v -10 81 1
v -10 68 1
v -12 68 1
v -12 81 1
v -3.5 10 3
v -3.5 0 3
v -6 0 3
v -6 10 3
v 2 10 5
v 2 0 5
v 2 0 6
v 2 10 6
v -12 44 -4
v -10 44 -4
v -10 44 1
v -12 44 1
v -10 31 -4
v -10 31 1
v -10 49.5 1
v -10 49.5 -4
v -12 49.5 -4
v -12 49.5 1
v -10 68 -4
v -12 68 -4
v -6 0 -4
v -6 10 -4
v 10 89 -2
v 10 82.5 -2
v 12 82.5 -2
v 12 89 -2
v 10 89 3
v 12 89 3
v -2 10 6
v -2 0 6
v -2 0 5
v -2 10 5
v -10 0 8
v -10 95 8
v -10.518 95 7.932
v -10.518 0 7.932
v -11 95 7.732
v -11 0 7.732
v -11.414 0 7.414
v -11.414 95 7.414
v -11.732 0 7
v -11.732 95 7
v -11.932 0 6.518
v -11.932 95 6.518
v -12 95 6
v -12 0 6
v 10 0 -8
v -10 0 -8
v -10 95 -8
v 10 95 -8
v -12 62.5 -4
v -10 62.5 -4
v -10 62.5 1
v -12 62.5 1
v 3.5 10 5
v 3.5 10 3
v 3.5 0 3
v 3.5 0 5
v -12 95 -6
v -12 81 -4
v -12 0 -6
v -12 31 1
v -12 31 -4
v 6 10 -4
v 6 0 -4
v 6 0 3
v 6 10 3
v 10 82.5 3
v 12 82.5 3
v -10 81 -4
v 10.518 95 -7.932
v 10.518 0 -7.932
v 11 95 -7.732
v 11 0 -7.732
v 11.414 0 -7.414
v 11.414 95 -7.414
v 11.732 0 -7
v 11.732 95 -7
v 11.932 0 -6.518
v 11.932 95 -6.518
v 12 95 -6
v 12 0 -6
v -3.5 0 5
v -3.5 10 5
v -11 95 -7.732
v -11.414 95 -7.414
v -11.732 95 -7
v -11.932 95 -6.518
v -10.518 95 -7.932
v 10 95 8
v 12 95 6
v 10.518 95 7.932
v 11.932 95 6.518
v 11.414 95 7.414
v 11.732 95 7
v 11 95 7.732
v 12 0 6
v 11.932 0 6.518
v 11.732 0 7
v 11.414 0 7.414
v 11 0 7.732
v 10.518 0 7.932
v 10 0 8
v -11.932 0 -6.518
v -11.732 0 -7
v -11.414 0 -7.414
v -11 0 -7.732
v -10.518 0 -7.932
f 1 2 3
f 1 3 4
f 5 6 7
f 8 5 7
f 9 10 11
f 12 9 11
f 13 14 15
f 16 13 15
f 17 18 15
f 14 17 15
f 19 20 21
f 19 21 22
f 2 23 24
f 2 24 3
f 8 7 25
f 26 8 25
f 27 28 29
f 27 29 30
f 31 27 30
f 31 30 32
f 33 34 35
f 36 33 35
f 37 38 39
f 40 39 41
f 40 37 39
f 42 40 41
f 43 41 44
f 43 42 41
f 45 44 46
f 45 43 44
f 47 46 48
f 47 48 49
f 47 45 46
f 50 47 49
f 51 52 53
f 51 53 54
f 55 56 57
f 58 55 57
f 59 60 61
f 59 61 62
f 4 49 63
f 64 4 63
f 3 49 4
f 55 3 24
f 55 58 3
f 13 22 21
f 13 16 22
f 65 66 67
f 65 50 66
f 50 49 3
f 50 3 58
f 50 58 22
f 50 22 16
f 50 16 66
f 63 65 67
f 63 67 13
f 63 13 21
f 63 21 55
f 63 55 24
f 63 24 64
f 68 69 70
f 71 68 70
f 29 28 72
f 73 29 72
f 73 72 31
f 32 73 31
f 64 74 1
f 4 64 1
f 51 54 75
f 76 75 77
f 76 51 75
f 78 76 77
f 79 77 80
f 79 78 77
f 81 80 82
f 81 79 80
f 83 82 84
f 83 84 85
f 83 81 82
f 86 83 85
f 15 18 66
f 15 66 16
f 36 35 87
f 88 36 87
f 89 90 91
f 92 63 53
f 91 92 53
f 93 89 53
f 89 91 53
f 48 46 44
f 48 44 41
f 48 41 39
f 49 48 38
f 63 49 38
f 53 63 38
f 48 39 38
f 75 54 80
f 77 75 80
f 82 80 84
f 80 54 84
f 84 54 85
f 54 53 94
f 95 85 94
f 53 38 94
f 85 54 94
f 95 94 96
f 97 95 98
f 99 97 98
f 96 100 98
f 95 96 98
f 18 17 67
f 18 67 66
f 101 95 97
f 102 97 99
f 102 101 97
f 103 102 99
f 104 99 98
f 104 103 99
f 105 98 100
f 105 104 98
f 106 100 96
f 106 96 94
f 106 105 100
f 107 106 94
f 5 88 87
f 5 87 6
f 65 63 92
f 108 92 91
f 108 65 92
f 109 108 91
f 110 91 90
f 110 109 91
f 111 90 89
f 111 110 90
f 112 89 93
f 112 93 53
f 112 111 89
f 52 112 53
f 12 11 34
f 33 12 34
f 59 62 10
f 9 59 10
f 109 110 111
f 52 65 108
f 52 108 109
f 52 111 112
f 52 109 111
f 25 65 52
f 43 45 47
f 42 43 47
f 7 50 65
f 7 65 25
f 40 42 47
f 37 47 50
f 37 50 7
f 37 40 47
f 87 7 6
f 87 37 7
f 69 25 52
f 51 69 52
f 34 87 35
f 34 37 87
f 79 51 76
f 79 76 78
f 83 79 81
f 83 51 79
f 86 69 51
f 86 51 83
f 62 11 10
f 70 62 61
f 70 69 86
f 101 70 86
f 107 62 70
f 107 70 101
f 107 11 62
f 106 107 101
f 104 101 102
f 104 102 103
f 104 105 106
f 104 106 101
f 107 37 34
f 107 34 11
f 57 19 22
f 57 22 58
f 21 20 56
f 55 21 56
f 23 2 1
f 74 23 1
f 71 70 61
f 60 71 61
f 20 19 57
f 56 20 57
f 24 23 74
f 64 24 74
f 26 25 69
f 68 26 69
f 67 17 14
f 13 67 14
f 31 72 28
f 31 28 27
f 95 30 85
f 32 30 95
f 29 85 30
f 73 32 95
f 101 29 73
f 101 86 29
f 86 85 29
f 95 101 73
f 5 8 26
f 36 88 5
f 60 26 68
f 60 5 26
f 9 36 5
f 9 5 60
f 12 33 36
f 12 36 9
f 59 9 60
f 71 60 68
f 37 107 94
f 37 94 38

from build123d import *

# Parameters (mm, degrees)
F1_DEPTH = 95
F2_DEPTH = 10
F4_START = 10
F3_W     = 6.5
F3_H     = 5
F4_DEPTH = 2
F5_START = -10
F3_W_2   = 13
F5_DEPTH = 2


with BuildPart() as f1:
    # F0 (on Front) → F1 (new body)
    with BuildSketch(Plane.XZ):
        with BuildLine():
            Line((-10, -8), (10, -8))
            ThreePointArc((10, -8), (11.4142135624, -7.4142135624), (12, -6))
            Line((12, -6), (12, 6))
            ThreePointArc((12, 6), (11.4142135624, 7.4142135624), (10, 8))
            Line((10, 8), (-10, 8))
            ThreePointArc((-10, 8), (-11.4142135624, 7.4142135624), (-12, 6))
            Line((-12, 6), (-12, -6))
            ThreePointArc((-12, -6), (-11.4142135624, -7.4142135624), (-10, -8))
        make_face()
        Polygon((-2, 5), (-2, 6), (2, 6), (2, 5), (3.5, 5), (3.5, 3), (6, 3), (6, -4), (-6, -4), (-6, 3), (-3.5, 3), (-3.5, 5), align=None, mode=Mode.SUBTRACT)
        Polygon((2, 6), (-2, 6), (-2, 5), (-3.5, 5), (-3.5, 3), (-6, 3), (-6, -4), (6, -4), (6, 3), (3.5, 3), (3.5, 5), (2, 5), align=None)
    extrude(amount=-F1_DEPTH)

    # F0 (on Front) → F2 (cut)
    with BuildSketch(Plane.XZ):
        Polygon((2, 6), (-2, 6), (-2, 5), (-3.5, 5), (-3.5, 3), (-6, 3), (-6, -4), (6, -4), (6, 3), (3.5, 3), (3.5, 5), (2, 5), align=None)
    extrude(amount=-F2_DEPTH, mode=Mode.SUBTRACT)

    # F3 (on Right) → F4 (cut)
    with BuildSketch(Plane.YZ.offset(F4_START)):
        with Locations((85.75, 0.5)):
            Rectangle(F3_W, F3_H)
    extrude(amount=F4_DEPTH, mode=Mode.SUBTRACT)

    # F3 (on Right) → F5 (cut)
    with BuildSketch(Plane.YZ.offset(F5_START)):
        with Locations((74.5, -1.5)):
            Rectangle(F3_W_2, F3_H)
        with Locations((56, -1.5)):
            Rectangle(F3_W_2, F3_H)
        with Locations((37.5, -1.5)):
            Rectangle(F3_W_2, F3_H)
    extrude(amount=-F5_DEPTH, mode=Mode.SUBTRACT)


solid = f1.part
